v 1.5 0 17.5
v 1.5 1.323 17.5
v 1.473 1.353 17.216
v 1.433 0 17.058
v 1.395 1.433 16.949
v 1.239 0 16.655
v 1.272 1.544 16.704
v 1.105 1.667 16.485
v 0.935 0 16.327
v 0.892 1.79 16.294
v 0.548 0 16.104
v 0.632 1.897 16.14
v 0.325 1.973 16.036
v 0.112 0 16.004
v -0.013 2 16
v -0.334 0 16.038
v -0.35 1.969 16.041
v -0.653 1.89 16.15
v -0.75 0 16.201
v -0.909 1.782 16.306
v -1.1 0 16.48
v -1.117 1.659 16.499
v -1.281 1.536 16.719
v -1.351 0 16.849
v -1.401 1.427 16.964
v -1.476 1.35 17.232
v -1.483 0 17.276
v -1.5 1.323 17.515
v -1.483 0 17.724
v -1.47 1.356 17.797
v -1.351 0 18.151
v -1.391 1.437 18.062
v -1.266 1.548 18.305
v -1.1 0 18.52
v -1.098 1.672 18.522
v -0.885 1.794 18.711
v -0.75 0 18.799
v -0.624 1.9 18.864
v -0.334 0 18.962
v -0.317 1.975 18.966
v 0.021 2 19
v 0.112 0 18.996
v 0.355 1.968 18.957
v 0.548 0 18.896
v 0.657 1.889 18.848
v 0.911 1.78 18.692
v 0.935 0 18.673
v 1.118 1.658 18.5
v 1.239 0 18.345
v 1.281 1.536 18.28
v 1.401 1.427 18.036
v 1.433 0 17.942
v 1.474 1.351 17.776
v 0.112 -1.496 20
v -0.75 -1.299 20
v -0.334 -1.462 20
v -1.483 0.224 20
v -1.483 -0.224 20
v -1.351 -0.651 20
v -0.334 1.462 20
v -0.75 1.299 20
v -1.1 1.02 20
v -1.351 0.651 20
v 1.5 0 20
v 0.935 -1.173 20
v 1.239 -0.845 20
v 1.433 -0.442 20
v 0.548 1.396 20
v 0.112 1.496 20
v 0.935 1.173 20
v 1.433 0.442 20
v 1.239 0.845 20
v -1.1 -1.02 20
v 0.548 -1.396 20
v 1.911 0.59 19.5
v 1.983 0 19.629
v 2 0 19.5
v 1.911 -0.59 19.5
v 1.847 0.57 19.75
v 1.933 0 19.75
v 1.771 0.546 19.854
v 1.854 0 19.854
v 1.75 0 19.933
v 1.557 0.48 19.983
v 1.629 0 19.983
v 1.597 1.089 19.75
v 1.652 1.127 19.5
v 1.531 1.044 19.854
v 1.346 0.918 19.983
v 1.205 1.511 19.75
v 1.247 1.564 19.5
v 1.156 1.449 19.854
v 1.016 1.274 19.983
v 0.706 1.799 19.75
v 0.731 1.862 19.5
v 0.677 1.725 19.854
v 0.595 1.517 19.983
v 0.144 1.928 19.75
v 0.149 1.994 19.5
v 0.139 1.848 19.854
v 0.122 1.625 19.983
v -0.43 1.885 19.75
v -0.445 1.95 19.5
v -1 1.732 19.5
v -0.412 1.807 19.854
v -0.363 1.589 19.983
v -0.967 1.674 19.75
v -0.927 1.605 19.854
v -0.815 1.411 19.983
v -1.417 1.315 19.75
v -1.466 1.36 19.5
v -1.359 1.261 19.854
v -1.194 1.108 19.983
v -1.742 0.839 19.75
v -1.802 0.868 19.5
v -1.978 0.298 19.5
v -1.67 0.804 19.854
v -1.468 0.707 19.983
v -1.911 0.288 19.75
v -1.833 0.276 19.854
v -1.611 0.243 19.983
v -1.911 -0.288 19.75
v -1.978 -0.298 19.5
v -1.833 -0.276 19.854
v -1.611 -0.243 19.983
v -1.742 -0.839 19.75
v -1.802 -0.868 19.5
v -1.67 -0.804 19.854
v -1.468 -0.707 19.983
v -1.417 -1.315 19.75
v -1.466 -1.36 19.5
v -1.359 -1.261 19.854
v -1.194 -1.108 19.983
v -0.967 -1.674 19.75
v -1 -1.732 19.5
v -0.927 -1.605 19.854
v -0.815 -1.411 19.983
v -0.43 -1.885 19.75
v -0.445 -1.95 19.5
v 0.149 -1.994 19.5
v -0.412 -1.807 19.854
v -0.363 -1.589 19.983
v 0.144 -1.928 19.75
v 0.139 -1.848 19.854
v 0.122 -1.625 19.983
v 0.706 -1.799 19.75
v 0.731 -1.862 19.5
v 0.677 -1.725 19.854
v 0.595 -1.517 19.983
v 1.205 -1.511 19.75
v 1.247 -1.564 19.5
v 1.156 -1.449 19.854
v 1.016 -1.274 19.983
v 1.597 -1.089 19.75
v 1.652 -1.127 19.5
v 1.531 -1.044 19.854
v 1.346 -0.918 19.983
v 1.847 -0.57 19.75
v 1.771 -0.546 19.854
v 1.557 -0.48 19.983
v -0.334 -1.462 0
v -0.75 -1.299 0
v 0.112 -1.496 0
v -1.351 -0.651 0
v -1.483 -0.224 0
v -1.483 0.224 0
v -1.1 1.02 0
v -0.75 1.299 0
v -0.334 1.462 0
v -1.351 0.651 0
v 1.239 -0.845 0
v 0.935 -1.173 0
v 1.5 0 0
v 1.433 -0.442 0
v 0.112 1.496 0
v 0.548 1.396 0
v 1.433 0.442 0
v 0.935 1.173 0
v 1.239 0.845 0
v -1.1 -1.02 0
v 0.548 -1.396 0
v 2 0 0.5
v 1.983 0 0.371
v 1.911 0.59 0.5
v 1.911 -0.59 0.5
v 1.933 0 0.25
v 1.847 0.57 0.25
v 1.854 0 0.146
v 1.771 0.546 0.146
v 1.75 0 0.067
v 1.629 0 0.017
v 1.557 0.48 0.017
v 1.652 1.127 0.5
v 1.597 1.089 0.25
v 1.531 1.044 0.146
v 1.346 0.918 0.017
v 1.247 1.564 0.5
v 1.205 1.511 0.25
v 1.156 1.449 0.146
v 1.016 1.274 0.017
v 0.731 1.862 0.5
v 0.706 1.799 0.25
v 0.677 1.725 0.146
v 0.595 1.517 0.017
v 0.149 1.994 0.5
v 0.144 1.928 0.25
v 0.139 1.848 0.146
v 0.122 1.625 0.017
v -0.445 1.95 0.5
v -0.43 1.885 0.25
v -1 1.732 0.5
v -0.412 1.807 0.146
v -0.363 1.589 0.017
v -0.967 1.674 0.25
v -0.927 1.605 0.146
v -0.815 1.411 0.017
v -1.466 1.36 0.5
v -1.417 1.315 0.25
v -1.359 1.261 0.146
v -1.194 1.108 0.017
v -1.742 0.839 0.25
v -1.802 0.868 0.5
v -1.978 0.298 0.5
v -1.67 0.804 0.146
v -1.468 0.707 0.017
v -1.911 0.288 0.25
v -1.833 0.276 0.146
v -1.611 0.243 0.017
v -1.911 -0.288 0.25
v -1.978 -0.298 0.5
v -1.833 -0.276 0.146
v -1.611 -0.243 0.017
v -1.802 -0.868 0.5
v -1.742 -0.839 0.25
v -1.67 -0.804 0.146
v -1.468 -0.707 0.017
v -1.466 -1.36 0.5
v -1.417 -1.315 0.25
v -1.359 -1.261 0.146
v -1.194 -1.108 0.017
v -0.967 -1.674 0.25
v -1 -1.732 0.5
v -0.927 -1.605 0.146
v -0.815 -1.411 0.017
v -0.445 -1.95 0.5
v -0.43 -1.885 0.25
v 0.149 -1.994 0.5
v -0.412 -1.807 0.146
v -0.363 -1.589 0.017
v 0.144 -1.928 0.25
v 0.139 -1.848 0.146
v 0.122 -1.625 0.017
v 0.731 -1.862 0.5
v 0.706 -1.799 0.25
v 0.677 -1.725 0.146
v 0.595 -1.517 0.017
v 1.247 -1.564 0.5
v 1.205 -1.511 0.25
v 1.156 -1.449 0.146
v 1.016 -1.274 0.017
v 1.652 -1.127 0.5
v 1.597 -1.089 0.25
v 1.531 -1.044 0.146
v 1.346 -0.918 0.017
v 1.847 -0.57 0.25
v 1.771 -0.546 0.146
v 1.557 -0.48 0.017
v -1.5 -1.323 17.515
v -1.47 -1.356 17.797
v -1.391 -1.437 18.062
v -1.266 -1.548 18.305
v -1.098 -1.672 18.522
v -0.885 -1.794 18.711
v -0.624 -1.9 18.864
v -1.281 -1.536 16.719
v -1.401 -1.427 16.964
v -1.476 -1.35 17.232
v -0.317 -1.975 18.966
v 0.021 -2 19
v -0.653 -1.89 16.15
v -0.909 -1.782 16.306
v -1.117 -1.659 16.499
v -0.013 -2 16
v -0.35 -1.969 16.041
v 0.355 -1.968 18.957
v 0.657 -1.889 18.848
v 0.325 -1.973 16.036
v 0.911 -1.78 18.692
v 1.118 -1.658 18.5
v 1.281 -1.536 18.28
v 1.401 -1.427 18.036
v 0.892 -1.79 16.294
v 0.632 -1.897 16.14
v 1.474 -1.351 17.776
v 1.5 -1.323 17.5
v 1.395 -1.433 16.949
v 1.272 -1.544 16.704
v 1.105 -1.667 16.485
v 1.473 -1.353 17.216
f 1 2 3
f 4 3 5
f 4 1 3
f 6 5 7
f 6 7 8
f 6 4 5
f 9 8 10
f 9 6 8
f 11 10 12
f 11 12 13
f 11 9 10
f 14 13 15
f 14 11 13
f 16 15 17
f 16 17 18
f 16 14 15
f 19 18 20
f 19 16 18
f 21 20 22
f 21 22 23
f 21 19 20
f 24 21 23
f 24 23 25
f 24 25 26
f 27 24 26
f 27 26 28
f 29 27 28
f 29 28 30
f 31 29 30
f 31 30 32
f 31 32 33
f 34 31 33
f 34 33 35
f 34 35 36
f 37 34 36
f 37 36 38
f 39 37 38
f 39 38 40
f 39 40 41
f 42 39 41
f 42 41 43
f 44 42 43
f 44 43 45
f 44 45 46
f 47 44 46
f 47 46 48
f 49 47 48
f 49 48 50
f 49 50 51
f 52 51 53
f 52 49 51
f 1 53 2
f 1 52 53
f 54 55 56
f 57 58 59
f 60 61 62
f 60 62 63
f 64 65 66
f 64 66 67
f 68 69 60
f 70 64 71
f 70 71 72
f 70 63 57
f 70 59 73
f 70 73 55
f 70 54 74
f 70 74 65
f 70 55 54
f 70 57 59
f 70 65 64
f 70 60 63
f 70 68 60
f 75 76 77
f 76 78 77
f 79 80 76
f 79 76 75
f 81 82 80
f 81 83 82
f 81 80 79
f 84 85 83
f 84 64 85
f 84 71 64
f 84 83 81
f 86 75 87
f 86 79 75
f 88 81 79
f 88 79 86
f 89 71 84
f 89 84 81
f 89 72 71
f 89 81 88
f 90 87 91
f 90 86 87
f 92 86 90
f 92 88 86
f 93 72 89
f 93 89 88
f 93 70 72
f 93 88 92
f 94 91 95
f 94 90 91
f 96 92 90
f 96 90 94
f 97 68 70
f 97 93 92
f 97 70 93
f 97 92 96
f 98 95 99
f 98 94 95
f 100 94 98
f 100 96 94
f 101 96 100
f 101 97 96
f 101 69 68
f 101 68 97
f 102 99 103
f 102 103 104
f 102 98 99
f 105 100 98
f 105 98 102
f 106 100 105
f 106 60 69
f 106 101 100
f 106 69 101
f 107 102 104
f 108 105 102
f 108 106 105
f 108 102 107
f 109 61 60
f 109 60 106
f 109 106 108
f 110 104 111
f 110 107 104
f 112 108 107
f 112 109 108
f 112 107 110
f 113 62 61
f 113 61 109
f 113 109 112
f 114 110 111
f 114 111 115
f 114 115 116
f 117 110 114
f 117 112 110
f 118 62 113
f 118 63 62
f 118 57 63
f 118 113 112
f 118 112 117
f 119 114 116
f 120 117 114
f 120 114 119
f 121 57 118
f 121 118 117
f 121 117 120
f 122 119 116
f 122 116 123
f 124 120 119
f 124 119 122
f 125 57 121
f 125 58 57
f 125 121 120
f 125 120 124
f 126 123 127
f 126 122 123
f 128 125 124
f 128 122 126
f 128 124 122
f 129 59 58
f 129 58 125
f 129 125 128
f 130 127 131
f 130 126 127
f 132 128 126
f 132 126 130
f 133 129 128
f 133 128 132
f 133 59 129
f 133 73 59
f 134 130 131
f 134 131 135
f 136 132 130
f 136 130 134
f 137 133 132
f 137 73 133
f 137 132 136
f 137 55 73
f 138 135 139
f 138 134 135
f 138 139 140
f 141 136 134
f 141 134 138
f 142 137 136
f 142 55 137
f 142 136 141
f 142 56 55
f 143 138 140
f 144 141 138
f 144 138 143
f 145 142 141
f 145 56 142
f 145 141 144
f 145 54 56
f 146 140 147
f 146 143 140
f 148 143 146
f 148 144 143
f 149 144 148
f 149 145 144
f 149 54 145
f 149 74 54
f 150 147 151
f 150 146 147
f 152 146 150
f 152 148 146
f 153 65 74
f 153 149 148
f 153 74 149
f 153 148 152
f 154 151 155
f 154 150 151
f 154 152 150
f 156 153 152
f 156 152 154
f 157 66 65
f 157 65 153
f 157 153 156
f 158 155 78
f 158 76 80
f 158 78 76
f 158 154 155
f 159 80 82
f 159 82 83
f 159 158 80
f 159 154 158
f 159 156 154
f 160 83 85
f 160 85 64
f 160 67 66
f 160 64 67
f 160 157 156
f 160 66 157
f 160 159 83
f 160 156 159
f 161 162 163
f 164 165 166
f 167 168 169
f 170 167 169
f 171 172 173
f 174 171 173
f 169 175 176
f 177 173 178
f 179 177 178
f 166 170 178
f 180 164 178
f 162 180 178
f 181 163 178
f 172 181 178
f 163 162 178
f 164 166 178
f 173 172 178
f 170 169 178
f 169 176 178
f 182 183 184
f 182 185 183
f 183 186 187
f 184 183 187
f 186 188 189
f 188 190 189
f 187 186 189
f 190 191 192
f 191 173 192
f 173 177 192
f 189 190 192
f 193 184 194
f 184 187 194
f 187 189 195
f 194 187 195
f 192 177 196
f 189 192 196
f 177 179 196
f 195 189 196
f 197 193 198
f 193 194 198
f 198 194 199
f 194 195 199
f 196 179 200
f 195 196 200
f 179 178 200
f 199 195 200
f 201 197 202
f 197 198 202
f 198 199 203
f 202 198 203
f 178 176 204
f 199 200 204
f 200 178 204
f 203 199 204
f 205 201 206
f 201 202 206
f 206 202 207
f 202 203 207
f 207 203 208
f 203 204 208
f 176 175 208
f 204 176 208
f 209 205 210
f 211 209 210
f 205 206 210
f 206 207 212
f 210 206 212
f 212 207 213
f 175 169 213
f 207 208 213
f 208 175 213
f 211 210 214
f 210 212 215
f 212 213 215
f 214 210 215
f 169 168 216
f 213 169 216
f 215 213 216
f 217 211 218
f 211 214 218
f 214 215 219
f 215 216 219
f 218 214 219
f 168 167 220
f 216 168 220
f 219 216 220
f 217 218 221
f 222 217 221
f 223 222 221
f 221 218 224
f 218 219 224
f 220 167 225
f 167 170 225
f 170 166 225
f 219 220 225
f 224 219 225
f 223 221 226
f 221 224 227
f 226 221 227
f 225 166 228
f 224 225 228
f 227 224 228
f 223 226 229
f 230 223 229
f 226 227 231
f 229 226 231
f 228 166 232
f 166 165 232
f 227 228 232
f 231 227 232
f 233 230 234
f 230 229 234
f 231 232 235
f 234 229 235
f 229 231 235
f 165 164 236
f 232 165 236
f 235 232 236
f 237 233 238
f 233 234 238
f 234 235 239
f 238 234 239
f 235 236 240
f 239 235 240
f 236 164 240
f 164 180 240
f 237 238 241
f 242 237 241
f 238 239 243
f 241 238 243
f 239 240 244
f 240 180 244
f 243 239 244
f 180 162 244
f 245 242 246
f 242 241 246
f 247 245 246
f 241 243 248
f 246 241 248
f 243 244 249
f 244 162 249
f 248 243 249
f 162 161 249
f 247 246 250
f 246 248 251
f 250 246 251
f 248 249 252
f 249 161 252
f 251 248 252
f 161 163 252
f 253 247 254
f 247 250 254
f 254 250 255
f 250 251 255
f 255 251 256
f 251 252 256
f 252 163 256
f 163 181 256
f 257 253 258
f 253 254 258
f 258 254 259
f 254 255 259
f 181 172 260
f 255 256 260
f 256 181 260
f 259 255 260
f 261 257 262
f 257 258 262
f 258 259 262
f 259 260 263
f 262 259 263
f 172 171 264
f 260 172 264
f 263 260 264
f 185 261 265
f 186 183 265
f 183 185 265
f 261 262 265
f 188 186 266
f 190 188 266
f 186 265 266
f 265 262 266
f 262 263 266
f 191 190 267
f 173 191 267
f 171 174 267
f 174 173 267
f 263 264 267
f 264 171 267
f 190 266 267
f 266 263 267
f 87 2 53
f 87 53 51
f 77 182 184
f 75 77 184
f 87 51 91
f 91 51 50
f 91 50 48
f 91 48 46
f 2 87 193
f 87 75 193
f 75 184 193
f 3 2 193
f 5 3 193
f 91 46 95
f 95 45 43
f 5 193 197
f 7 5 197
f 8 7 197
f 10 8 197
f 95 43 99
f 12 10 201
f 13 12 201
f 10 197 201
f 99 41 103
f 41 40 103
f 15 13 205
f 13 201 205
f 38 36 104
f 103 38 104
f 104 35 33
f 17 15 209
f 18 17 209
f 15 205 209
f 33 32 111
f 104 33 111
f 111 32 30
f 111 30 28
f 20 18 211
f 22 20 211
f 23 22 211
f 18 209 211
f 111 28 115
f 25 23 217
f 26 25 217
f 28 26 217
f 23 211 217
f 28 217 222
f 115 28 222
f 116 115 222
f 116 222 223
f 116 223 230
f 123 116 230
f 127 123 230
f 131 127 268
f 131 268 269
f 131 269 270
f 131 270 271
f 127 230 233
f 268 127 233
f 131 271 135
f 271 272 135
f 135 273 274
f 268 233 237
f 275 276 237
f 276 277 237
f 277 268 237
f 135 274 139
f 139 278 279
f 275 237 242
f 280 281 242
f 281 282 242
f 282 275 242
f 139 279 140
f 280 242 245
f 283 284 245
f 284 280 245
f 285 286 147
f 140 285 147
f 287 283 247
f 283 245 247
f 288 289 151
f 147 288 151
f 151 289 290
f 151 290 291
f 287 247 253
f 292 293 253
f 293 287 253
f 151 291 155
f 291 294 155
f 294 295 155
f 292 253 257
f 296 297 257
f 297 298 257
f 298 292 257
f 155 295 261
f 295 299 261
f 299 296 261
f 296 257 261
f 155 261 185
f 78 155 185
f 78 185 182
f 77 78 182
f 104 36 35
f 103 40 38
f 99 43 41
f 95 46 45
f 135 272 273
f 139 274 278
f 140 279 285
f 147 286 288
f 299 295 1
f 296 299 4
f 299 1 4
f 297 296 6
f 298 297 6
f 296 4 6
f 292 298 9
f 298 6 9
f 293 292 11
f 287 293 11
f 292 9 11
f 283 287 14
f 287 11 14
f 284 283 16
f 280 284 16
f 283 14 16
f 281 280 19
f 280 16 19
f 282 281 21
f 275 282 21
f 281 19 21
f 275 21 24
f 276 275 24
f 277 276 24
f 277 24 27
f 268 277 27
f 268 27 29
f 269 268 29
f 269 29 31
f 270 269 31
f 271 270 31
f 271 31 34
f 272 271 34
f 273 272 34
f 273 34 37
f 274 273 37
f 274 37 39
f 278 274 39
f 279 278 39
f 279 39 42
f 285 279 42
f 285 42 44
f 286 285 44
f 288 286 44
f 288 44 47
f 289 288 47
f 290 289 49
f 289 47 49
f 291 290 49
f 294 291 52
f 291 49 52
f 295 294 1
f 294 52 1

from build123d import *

# Parameters (mm, degrees)
SKETCH1_R               = 2
BOSS_EXTRUDE1_DEPTH     = 20
SKETCH2_R               = 1.5
CUT_EXTRUDE1_DEPTH      = 3
CUT_EXTRUDE1_DEPTH_BACK = 3
FILLET1_R               = 0.5


with BuildPart() as part:
    # Sketch1 → Boss-Extrude1 (new body)
    with BuildSketch(Plane.XY):
        Circle(SKETCH1_R)
    extrude(amount=BOSS_EXTRUDE1_DEPTH)

    # Sketch2 → Cut-Extrude1 (cut, two sides)
    with BuildSketch(Plane(origin=(0, 0, 0), x_dir=(1, 0, 0), z_dir=(0, 1, 0))) as cut_extrude1_sk:
        with Locations((0, -17.5)):
            Circle(SKETCH2_R)
    extrude(amount=CUT_EXTRUDE1_DEPTH, mode=Mode.SUBTRACT)
    extrude(cut_extrude1_sk.sketch, amount=-CUT_EXTRUDE1_DEPTH_BACK, mode=Mode.SUBTRACT)

    # Fillet1
    fillet1_edges = [part.edges().sort_by_distance(p)[0] for p in [
        (-2, 0, 0),
        (-2, 0, 20),
    ]]
    fillet(fillet1_edges, radius=FILLET1_R)


solid = part.part
